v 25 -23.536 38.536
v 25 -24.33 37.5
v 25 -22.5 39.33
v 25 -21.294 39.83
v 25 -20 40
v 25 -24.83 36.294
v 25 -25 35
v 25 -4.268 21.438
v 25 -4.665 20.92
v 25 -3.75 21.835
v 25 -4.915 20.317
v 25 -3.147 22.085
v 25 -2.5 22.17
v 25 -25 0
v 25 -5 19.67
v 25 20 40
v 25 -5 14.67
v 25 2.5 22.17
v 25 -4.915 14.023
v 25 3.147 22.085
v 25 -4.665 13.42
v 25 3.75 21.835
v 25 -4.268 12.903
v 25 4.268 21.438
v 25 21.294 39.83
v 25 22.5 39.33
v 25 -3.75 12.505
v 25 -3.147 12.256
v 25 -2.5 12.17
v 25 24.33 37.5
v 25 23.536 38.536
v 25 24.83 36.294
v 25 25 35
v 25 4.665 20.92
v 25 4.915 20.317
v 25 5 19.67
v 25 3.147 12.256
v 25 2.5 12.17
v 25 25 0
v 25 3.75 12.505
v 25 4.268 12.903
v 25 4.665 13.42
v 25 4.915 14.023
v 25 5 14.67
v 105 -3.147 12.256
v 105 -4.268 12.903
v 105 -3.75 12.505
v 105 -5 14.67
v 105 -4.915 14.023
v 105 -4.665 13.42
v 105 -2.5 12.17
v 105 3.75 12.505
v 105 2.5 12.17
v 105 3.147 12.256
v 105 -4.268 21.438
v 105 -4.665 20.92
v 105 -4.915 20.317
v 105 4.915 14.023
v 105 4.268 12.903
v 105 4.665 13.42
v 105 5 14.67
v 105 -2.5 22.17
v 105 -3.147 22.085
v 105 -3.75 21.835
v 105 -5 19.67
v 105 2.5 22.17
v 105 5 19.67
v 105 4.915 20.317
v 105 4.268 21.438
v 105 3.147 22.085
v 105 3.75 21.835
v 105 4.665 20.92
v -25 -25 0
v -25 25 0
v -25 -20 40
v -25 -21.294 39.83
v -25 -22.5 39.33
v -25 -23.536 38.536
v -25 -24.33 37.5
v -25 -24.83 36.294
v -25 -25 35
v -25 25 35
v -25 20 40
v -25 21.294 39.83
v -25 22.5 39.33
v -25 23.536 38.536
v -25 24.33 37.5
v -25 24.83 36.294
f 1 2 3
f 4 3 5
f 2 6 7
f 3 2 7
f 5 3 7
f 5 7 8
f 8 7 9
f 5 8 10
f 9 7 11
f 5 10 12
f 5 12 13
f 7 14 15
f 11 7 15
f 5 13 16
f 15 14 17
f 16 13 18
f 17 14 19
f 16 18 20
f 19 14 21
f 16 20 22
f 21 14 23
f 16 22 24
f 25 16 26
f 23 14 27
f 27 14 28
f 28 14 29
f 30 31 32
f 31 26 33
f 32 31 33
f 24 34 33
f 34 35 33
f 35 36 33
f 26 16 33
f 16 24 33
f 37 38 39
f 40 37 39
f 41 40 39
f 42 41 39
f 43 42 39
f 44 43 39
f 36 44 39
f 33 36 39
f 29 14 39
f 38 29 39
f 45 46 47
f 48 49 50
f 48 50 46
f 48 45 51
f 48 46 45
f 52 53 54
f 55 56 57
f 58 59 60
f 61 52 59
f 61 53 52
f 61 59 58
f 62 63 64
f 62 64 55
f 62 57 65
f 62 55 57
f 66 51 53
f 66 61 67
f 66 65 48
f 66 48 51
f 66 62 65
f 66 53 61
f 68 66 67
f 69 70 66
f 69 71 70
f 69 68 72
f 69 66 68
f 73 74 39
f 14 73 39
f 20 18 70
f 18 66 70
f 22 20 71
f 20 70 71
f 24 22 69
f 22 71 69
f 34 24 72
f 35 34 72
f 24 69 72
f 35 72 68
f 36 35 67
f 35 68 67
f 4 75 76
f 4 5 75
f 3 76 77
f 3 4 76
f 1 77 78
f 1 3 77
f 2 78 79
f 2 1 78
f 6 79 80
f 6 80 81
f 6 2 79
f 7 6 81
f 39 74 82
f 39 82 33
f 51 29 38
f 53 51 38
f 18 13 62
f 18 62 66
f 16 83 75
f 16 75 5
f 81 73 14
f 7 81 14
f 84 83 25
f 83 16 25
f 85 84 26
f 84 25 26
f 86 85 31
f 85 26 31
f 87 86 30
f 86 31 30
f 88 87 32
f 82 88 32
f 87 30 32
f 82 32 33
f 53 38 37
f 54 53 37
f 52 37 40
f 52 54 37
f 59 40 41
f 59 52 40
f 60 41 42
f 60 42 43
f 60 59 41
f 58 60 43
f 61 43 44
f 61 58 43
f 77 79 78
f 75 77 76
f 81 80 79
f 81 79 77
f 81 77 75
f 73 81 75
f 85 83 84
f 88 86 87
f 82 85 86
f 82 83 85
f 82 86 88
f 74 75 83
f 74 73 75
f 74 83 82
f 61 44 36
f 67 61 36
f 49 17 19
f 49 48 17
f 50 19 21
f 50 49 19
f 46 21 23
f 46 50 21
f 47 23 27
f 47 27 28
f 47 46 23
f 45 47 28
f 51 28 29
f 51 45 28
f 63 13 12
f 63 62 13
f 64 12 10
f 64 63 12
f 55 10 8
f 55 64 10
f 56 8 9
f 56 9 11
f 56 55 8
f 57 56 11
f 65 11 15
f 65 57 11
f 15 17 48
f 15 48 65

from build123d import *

# Parameters (mm, degrees)
F0_W     = 50
F0_H     = 50
F1_DEPTH = 40
F2_W     = 10
F2_H     = 10
F3_DEPTH = 80
F4_R     = 2.5
F5_R     = 2.5
F6_R     = 2.5
F7_R     = 2.5
F8_R     = 5
F9_R     = 5


with BuildPart() as f1:
    # F0 (on Top) → F1 (new body)
    with BuildSketch(Plane.XY):
        Rectangle(F0_W, F0_H)
    extrude(amount=F1_DEPTH)

    # F2 (on face) → F3 (join)
    with BuildSketch(Plane.YZ.offset(25)):
        with Locations((0, 17.170411)):
            Rectangle(F2_W, F2_H)
    extrude(amount=F3_DEPTH)

    # F4
    f4_edges = [f1.edges().sort_by_distance(p)[0] for p in [
        (65, 5, 22.170411),
    ]]
    fillet(f4_edges, radius=F4_R)

    # F5
    f5_edges = [f1.edges().sort_by_distance(p)[0] for p in [
        (65, -5, 22.170411),
    ]]
    fillet(f5_edges, radius=F5_R)

    # F6
    f6_edges = [f1.edges().sort_by_distance(p)[0] for p in [
        (65, -5, 12.170411),
    ]]
    fillet(f6_edges, radius=F6_R)

    # F7
    f7_edges = [f1.edges().sort_by_distance(p)[0] for p in [
        (65, 5, 12.170411),
    ]]
    fillet(f7_edges, radius=F7_R)

    # F8
    f8_edges = [f1.edges().sort_by_distance(p)[0] for p in [
        (0, 25, 40),
    ]]
    fillet(f8_edges, radius=F8_R)

    # F9
    f9_edges = [f1.edges().sort_by_distance(p)[0] for p in [
        (0, -25, 40),
    ]]
    fillet(f9_edges, radius=F9_R)


solid = f1.part
